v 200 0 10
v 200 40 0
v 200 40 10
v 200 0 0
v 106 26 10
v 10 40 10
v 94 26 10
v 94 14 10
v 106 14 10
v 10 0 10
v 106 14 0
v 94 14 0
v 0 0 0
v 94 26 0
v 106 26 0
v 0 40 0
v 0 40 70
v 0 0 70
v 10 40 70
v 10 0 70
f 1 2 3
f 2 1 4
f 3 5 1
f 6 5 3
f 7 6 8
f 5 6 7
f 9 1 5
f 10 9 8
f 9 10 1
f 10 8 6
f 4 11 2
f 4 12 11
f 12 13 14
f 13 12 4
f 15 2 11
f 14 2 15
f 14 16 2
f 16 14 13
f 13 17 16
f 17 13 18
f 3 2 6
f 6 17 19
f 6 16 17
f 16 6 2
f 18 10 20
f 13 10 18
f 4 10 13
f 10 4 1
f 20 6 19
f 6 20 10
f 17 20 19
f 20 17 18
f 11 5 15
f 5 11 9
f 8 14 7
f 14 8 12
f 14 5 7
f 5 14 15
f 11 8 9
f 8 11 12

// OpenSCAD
$fn = 32;

// ----------------------------------------------------------------------
// Gantry bracket: 200-250 mm L bracket
// ----------------------------------------------------------------------

// --- parameters (mm) ---
base_l = 200;             // base arm length, X
arm_w = 40;               // arm width, Y
thick = 10;               // arm thickness
up_h = 60;                // vertical arm height, Z
slot_w = 12;              // adjustment slot width in the base

total_h = up_h + thick;  // overall height

difference() {
  union() {
    cube([base_l, arm_w, thick]);
    cube([thick, arm_w, total_h]);
  }
  translate([base_l / 2 - slot_w / 2, arm_w / 2 - slot_w / 2, -1])
    cube([slot_w, slot_w, thick + 2]);
}
